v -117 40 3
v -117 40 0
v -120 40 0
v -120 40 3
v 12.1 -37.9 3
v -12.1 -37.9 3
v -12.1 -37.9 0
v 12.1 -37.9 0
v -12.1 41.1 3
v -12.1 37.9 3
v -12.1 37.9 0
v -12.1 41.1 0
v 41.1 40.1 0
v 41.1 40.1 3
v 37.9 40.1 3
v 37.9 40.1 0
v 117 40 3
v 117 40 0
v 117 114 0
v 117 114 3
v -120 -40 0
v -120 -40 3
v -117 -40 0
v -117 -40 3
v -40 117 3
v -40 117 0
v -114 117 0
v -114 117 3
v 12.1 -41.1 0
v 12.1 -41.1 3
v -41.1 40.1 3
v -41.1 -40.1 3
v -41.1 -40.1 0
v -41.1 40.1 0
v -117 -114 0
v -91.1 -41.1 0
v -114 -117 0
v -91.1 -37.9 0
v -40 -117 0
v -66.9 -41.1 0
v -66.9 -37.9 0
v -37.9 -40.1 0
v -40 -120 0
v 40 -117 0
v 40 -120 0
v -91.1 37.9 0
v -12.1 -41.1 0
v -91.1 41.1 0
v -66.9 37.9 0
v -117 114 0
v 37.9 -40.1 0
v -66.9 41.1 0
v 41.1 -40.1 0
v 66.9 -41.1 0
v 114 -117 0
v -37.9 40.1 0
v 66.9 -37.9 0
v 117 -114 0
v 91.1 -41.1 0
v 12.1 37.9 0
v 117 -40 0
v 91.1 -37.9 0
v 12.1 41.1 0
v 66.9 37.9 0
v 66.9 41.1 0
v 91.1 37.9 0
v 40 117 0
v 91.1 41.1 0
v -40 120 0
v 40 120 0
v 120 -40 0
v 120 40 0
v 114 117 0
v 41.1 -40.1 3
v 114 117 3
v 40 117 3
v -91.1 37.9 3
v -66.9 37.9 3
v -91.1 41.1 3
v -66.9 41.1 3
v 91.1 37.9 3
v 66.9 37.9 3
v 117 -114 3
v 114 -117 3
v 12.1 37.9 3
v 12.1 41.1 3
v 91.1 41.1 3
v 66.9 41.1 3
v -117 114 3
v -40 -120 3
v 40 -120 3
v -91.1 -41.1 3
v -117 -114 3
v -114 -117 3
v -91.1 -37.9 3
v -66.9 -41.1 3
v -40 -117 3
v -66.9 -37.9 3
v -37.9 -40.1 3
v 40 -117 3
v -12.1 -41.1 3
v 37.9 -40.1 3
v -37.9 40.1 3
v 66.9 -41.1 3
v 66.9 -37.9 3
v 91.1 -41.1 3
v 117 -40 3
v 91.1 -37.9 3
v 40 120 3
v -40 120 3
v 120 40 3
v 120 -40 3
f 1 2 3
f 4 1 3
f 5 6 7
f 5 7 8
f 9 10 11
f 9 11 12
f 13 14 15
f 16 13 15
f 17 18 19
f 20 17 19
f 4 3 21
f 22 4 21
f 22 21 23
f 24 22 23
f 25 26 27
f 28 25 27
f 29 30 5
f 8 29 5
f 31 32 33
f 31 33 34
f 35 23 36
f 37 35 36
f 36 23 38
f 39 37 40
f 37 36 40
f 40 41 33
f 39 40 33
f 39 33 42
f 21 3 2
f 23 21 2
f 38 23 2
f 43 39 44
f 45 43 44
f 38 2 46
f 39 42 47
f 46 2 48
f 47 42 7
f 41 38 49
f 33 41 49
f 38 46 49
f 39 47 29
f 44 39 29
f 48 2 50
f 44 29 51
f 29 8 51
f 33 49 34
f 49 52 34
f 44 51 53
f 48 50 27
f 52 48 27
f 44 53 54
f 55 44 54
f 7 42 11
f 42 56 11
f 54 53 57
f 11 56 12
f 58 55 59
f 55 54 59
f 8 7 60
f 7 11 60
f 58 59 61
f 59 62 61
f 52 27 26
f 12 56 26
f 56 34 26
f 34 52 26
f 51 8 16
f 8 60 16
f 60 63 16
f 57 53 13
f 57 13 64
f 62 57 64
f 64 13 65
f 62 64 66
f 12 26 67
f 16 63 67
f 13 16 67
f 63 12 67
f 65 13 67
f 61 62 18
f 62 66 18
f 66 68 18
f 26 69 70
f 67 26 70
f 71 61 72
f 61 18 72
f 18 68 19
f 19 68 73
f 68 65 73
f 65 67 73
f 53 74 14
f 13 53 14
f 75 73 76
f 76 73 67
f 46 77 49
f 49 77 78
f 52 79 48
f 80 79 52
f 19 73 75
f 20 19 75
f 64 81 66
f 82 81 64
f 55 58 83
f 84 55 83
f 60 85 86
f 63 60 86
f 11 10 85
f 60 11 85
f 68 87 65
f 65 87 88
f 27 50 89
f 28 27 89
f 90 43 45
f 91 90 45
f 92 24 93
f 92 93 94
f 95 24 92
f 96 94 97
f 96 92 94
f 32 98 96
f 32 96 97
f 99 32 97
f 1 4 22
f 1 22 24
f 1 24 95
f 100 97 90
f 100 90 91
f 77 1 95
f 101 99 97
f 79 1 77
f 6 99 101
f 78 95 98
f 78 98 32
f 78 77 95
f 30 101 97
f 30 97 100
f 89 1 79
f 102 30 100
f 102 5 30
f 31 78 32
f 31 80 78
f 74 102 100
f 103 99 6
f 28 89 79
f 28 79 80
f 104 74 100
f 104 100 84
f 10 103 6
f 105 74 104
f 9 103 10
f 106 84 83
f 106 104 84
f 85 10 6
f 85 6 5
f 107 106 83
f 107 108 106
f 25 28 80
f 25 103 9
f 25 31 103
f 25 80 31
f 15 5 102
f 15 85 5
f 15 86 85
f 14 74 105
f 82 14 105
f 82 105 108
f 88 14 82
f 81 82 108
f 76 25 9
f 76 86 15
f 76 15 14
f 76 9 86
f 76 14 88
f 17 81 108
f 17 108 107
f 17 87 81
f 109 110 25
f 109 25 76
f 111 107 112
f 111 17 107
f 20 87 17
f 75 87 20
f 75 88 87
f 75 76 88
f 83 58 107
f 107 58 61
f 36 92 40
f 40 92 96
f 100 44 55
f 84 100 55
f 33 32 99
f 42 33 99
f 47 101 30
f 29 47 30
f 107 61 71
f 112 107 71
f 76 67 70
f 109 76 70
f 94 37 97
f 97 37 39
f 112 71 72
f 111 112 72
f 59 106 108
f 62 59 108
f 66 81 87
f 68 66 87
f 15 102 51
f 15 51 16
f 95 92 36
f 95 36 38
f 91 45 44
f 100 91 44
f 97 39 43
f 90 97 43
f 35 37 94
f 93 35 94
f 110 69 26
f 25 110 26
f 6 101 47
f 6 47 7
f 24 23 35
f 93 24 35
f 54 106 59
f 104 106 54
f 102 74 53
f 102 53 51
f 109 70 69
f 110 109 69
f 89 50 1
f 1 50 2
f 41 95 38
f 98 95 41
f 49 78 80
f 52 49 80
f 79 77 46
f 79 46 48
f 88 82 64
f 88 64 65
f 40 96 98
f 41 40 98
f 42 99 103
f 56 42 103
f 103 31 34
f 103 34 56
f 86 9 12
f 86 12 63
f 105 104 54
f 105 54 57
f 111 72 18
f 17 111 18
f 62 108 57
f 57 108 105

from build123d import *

# Parameters (mm, degrees)
F1_DEPTH = 3
F2_SIZE  = 3
F3_W     = 3.2
F3_H     = 80.2
F4_DEPTH = 3.001
F5_W     = 24.2
F5_H     = 3.2
F6_DEPTH = 3.001
F7_W     = 24.2
F7_H     = 3.2
F8_DEPTH = 3.001


# Not quite as in the source:
# - a pattern or mirror of a feature is missing from the dataset's text; its kind, count and spacing are read off the source's solid


with BuildPart() as f1:
    # F0 (on Top) → F1 (new body)
    with BuildSketch(Plane.XY):
        Polygon((117, 40), (117, 117), (40, 117), (40, 120), (-40, 120), (-40, 117), (-117, 117), (-117, 40), (-120, 40), (-120, -40), (-117, -40), (-117, -117), (-40, -117), (-40, -120), (40, -120), (40, -117), (117, -117), (117, -40), (120, -40), (120, 40), align=None)
    extrude(amount=F1_DEPTH)

    # F2
    f2_edges = [f1.edges().sort_by_distance(p)[0] for p in [
        (117, -117, 1.5),
        (-117, 117, 1.5),
        (117, 117, 1.5),
        (-117, -117, 1.5),
    ]]
    chamfer(f2_edges, length=F2_SIZE)

    # F3 (on face) → F4 (cut, through all)
    with BuildSketch(Plane.XY.offset(3)):
        with Locations((-39.5, 0)):
            Rectangle(F3_W, F3_H)
    f4 = extrude(amount=-F4_DEPTH, mode=Mode.SUBTRACT)

    # F4_copies: F4 across plane
    add(f4.mirror(Plane(origin=(0, 0, 0), x_dir=(0, 0, 1), z_dir=(1, 0, 0))), mode=Mode.SUBTRACT)

    # F5 (on face) → F6 (cut, through all)
    with BuildSketch(Plane.XY.offset(3)):
        with Locations((-79, 39.5)):
            Rectangle(F5_W, F5_H)
        with Locations((-79, -39.5)):
            Rectangle(F5_W, F5_H)
    f6 = extrude(amount=-F6_DEPTH, mode=Mode.SUBTRACT)

    # F6_copies: F6 across plane
    add(f6.mirror(Plane(origin=(0, 0, 0), x_dir=(0, 0, 1), z_dir=(1, 0, 0))), mode=Mode.SUBTRACT)

    # F7 (on face) → F8 (cut, through all)
    with BuildSketch(Plane.XY.offset(3)):
        with Locations((0, 39.5)):
            Rectangle(F7_W, F7_H)
        with Locations((0, -39.5)):
            Rectangle(F7_W, F7_H)
    extrude(amount=-F8_DEPTH, mode=Mode.SUBTRACT)


solid = f1.part
